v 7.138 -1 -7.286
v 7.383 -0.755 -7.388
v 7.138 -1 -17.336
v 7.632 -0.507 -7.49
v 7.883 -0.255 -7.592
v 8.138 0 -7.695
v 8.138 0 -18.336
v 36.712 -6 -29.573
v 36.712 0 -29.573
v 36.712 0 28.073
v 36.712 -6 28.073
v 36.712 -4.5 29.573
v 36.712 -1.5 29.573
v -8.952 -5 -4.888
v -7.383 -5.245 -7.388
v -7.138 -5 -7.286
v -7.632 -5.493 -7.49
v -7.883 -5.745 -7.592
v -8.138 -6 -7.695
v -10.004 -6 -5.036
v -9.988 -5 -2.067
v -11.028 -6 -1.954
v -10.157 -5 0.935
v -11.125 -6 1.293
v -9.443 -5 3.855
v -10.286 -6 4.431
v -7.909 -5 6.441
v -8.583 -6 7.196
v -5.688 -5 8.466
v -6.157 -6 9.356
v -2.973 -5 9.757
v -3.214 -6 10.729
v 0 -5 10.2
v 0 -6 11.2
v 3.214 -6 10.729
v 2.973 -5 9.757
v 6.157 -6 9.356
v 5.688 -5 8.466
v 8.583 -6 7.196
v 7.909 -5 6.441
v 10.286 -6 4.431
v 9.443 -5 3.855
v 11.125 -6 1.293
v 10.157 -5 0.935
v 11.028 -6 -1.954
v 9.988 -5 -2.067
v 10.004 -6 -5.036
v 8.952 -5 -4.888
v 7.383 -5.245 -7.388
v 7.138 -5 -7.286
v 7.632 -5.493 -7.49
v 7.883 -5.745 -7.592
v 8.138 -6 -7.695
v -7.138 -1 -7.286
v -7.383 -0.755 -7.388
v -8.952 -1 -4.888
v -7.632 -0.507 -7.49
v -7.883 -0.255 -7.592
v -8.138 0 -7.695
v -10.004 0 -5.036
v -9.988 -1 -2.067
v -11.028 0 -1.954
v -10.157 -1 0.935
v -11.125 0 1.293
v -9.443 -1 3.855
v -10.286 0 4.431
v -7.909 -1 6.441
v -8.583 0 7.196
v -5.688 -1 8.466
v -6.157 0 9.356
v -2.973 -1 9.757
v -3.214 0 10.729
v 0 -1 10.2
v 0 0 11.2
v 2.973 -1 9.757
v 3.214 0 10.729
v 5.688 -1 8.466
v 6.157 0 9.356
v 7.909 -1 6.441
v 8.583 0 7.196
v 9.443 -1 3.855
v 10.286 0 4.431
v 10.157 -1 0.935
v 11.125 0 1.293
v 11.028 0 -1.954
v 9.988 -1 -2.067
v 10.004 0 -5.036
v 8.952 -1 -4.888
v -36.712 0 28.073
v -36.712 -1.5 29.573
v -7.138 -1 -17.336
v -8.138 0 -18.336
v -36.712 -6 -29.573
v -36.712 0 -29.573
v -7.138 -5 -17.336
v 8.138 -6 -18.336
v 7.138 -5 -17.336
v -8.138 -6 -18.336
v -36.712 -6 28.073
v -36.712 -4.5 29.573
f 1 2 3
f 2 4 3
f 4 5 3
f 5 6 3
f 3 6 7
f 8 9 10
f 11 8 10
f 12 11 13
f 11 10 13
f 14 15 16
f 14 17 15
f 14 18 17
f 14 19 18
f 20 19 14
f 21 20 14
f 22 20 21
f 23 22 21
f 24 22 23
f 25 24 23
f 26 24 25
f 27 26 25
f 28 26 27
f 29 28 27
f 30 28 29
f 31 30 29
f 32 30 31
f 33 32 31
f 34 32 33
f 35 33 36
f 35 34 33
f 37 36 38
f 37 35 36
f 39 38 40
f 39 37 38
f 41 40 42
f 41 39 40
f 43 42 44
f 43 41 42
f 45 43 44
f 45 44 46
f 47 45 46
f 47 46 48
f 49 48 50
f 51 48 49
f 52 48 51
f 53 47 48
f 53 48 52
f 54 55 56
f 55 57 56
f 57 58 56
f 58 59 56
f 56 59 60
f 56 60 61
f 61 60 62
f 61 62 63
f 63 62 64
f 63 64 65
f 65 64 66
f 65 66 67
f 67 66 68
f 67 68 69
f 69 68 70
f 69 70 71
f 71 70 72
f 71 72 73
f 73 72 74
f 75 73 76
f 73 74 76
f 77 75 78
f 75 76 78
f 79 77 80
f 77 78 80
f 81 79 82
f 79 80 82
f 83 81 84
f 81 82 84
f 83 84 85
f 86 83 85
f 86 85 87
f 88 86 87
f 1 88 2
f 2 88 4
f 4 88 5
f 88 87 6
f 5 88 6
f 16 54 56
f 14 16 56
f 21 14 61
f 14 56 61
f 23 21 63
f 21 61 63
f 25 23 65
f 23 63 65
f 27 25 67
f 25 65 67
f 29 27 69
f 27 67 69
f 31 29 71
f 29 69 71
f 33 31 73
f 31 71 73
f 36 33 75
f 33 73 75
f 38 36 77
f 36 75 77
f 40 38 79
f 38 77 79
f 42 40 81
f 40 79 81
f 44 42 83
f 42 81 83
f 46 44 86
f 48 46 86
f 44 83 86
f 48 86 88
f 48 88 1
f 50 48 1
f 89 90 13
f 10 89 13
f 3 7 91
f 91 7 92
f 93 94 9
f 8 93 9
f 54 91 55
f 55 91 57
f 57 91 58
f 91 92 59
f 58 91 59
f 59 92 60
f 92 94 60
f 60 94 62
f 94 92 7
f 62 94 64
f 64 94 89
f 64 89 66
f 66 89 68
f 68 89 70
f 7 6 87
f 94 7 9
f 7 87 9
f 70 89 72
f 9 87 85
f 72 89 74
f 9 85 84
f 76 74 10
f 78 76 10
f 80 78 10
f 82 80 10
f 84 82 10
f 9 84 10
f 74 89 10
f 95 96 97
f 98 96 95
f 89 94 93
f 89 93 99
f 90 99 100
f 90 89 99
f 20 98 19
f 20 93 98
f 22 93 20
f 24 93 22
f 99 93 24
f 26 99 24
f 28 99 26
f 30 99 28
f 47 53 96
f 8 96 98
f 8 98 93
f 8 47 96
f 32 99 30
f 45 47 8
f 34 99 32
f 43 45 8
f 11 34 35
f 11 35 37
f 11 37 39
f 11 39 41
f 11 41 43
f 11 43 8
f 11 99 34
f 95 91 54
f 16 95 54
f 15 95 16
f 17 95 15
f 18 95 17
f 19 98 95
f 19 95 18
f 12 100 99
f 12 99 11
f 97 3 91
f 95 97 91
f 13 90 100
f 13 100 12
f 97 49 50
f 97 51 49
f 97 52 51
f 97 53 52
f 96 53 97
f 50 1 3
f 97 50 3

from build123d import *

# Parameters (mm, degrees)
F0_W     = 73.423766
F0_H     = 59.146922
F1_DEPTH = 6
F2_SIZE  = 1
F3_SIZE  = 1.5


with BuildPart() as f1:
    # F0 (on Front) → F1 (new body)
    with BuildSketch(Plane.XZ):
        Rectangle(F0_W, F0_H)
        with BuildLine():
            Line((7.138422, -7.285804), (7.138422, -17.335804))
            Line((7.138422, -17.335804), (-7.138422, -17.335804))
            Line((-7.138422, -17.335804), (-7.138422, -7.285804))
            ThreePointArc((-7.138422, -7.285804), (0, 10.2), (7.138422, -7.285804))
        make_face(mode=Mode.SUBTRACT)
    extrude(amount=F1_DEPTH)

    # F2
    f2_edges = [f1.edges().sort_by_distance(p)[0] for p in [
        (0, -6, 10.2),
        (-7.138422, -6, -12.310804),
        (0, -6, -17.335804),
        (7.138422, -6, -12.310804),
        (0, 0, -17.335804),
        (-7.138422, 0, -12.310804),
        (0, 0, 10.2),
        (7.138422, 0, -12.310804),
    ]]
    chamfer(f2_edges, length=F2_SIZE)

    # F3
    f3_edges = [f1.edges().sort_by_distance(p)[0] for p in [
        (0, -6, 29.573461),
        (0, 0, 29.573461),
    ]]
    chamfer(f3_edges, length=F3_SIZE)


solid = f1.part
